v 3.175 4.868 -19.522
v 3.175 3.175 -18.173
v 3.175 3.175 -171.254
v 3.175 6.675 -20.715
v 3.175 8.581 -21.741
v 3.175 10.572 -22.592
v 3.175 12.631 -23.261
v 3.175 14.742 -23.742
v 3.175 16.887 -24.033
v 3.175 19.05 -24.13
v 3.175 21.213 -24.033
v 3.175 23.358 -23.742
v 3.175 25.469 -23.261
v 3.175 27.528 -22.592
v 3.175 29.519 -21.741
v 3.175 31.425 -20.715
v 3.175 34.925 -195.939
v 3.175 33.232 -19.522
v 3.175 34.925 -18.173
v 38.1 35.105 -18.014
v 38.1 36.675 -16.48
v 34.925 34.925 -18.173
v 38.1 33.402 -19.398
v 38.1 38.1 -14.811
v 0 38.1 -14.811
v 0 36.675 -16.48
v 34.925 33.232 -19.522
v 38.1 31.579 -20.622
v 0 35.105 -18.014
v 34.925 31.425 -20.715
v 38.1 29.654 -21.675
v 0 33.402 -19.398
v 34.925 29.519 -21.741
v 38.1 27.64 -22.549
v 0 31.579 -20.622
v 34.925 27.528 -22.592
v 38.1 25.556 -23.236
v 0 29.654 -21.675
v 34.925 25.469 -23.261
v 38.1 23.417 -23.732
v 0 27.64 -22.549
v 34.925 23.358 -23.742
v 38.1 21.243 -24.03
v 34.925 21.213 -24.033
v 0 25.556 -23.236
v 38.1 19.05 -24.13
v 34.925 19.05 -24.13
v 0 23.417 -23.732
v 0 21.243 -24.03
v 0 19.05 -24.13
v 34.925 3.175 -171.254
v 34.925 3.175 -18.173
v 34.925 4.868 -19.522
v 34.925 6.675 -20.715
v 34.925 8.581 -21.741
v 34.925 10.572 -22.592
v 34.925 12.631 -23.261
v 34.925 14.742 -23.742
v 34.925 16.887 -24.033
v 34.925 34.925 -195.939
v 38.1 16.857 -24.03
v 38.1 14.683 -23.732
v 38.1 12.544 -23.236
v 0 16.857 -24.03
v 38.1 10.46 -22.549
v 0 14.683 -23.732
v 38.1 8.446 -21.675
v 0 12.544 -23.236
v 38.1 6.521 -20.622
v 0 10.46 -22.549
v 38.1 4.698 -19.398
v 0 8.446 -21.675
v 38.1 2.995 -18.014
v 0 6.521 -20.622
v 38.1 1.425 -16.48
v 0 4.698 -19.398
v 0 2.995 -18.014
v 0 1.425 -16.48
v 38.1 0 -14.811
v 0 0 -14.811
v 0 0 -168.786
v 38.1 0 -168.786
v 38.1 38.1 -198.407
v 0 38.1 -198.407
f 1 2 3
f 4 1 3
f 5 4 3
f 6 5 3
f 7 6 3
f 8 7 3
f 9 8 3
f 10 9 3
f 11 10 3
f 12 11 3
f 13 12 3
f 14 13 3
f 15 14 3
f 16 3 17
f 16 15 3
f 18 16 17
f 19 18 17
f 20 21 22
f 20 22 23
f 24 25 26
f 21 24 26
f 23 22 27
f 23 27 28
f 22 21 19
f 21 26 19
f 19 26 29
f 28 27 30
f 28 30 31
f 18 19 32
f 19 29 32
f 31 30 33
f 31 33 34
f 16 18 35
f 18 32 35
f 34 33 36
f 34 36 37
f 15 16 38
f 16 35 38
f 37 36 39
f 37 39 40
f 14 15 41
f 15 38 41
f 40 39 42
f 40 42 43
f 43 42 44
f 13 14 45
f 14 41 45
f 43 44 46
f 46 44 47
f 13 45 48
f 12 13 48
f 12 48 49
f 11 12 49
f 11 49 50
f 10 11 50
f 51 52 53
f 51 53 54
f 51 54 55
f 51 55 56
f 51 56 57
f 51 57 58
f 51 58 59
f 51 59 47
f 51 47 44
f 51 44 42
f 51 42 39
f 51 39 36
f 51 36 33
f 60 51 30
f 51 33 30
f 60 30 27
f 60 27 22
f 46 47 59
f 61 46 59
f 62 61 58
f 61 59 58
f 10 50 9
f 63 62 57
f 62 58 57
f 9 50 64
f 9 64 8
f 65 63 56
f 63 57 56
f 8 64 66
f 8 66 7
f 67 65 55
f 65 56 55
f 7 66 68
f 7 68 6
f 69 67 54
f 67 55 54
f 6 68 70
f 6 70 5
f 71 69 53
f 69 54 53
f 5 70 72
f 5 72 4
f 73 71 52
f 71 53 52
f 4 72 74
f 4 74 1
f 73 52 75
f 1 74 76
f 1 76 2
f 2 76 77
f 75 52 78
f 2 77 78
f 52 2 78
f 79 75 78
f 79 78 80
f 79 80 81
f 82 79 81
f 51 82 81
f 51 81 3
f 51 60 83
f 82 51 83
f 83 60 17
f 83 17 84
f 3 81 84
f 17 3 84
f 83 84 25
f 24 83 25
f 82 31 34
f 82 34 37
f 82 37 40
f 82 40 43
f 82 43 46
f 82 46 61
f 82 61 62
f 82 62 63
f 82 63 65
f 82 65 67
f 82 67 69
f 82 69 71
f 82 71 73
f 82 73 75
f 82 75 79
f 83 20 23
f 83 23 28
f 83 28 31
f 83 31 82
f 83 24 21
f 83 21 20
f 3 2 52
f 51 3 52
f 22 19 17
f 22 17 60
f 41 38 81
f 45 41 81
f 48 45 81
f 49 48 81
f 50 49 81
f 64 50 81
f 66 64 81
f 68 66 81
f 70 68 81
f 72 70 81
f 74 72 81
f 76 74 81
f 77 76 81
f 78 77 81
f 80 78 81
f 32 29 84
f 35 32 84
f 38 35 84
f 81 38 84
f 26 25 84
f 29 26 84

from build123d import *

# Parameters (mm, degrees)
BOSS_EXTRUDE1_DEPTH = 38.1
SKETCH2_W           = 31.75
SKETCH2_H           = 31.75
CUT_EXTRUDE1_DEPTH  = 206.593204132


with BuildPart() as part:
    # Sketch1 → Boss-Extrude1 (new body)
    with BuildSketch(Plane(origin=(0, 0, 0), x_dir=(0, 0, -1), z_dir=(1, 0, 0))):
        with BuildLine():
            Line((168.785784374, 0), (198.40702, 38.1))
            Line((198.40702, 38.1), (14.810617813, 38.1))
            ThreePointArc((14.810617813, 38.1), (21.675298243, 29.653694926), (24.13, 19.05))
            ThreePointArc((24.13, 19.05), (21.675298243, 8.446305074), (14.810617813, 0))
            Line((14.810617813, 0), (168.785784374, 0))
        make_face()
    extrude(amount=BOSS_EXTRUDE1_DEPTH)

    # Sketch2 → Cut-Extrude1 (cut, through all)
    with BuildSketch(Plane.XY):
        with Locations((19.05, 19.05)):
            Rectangle(SKETCH2_W, SKETCH2_H)
    extrude(amount=-CUT_EXTRUDE1_DEPTH, mode=Mode.SUBTRACT)


solid = part.part
